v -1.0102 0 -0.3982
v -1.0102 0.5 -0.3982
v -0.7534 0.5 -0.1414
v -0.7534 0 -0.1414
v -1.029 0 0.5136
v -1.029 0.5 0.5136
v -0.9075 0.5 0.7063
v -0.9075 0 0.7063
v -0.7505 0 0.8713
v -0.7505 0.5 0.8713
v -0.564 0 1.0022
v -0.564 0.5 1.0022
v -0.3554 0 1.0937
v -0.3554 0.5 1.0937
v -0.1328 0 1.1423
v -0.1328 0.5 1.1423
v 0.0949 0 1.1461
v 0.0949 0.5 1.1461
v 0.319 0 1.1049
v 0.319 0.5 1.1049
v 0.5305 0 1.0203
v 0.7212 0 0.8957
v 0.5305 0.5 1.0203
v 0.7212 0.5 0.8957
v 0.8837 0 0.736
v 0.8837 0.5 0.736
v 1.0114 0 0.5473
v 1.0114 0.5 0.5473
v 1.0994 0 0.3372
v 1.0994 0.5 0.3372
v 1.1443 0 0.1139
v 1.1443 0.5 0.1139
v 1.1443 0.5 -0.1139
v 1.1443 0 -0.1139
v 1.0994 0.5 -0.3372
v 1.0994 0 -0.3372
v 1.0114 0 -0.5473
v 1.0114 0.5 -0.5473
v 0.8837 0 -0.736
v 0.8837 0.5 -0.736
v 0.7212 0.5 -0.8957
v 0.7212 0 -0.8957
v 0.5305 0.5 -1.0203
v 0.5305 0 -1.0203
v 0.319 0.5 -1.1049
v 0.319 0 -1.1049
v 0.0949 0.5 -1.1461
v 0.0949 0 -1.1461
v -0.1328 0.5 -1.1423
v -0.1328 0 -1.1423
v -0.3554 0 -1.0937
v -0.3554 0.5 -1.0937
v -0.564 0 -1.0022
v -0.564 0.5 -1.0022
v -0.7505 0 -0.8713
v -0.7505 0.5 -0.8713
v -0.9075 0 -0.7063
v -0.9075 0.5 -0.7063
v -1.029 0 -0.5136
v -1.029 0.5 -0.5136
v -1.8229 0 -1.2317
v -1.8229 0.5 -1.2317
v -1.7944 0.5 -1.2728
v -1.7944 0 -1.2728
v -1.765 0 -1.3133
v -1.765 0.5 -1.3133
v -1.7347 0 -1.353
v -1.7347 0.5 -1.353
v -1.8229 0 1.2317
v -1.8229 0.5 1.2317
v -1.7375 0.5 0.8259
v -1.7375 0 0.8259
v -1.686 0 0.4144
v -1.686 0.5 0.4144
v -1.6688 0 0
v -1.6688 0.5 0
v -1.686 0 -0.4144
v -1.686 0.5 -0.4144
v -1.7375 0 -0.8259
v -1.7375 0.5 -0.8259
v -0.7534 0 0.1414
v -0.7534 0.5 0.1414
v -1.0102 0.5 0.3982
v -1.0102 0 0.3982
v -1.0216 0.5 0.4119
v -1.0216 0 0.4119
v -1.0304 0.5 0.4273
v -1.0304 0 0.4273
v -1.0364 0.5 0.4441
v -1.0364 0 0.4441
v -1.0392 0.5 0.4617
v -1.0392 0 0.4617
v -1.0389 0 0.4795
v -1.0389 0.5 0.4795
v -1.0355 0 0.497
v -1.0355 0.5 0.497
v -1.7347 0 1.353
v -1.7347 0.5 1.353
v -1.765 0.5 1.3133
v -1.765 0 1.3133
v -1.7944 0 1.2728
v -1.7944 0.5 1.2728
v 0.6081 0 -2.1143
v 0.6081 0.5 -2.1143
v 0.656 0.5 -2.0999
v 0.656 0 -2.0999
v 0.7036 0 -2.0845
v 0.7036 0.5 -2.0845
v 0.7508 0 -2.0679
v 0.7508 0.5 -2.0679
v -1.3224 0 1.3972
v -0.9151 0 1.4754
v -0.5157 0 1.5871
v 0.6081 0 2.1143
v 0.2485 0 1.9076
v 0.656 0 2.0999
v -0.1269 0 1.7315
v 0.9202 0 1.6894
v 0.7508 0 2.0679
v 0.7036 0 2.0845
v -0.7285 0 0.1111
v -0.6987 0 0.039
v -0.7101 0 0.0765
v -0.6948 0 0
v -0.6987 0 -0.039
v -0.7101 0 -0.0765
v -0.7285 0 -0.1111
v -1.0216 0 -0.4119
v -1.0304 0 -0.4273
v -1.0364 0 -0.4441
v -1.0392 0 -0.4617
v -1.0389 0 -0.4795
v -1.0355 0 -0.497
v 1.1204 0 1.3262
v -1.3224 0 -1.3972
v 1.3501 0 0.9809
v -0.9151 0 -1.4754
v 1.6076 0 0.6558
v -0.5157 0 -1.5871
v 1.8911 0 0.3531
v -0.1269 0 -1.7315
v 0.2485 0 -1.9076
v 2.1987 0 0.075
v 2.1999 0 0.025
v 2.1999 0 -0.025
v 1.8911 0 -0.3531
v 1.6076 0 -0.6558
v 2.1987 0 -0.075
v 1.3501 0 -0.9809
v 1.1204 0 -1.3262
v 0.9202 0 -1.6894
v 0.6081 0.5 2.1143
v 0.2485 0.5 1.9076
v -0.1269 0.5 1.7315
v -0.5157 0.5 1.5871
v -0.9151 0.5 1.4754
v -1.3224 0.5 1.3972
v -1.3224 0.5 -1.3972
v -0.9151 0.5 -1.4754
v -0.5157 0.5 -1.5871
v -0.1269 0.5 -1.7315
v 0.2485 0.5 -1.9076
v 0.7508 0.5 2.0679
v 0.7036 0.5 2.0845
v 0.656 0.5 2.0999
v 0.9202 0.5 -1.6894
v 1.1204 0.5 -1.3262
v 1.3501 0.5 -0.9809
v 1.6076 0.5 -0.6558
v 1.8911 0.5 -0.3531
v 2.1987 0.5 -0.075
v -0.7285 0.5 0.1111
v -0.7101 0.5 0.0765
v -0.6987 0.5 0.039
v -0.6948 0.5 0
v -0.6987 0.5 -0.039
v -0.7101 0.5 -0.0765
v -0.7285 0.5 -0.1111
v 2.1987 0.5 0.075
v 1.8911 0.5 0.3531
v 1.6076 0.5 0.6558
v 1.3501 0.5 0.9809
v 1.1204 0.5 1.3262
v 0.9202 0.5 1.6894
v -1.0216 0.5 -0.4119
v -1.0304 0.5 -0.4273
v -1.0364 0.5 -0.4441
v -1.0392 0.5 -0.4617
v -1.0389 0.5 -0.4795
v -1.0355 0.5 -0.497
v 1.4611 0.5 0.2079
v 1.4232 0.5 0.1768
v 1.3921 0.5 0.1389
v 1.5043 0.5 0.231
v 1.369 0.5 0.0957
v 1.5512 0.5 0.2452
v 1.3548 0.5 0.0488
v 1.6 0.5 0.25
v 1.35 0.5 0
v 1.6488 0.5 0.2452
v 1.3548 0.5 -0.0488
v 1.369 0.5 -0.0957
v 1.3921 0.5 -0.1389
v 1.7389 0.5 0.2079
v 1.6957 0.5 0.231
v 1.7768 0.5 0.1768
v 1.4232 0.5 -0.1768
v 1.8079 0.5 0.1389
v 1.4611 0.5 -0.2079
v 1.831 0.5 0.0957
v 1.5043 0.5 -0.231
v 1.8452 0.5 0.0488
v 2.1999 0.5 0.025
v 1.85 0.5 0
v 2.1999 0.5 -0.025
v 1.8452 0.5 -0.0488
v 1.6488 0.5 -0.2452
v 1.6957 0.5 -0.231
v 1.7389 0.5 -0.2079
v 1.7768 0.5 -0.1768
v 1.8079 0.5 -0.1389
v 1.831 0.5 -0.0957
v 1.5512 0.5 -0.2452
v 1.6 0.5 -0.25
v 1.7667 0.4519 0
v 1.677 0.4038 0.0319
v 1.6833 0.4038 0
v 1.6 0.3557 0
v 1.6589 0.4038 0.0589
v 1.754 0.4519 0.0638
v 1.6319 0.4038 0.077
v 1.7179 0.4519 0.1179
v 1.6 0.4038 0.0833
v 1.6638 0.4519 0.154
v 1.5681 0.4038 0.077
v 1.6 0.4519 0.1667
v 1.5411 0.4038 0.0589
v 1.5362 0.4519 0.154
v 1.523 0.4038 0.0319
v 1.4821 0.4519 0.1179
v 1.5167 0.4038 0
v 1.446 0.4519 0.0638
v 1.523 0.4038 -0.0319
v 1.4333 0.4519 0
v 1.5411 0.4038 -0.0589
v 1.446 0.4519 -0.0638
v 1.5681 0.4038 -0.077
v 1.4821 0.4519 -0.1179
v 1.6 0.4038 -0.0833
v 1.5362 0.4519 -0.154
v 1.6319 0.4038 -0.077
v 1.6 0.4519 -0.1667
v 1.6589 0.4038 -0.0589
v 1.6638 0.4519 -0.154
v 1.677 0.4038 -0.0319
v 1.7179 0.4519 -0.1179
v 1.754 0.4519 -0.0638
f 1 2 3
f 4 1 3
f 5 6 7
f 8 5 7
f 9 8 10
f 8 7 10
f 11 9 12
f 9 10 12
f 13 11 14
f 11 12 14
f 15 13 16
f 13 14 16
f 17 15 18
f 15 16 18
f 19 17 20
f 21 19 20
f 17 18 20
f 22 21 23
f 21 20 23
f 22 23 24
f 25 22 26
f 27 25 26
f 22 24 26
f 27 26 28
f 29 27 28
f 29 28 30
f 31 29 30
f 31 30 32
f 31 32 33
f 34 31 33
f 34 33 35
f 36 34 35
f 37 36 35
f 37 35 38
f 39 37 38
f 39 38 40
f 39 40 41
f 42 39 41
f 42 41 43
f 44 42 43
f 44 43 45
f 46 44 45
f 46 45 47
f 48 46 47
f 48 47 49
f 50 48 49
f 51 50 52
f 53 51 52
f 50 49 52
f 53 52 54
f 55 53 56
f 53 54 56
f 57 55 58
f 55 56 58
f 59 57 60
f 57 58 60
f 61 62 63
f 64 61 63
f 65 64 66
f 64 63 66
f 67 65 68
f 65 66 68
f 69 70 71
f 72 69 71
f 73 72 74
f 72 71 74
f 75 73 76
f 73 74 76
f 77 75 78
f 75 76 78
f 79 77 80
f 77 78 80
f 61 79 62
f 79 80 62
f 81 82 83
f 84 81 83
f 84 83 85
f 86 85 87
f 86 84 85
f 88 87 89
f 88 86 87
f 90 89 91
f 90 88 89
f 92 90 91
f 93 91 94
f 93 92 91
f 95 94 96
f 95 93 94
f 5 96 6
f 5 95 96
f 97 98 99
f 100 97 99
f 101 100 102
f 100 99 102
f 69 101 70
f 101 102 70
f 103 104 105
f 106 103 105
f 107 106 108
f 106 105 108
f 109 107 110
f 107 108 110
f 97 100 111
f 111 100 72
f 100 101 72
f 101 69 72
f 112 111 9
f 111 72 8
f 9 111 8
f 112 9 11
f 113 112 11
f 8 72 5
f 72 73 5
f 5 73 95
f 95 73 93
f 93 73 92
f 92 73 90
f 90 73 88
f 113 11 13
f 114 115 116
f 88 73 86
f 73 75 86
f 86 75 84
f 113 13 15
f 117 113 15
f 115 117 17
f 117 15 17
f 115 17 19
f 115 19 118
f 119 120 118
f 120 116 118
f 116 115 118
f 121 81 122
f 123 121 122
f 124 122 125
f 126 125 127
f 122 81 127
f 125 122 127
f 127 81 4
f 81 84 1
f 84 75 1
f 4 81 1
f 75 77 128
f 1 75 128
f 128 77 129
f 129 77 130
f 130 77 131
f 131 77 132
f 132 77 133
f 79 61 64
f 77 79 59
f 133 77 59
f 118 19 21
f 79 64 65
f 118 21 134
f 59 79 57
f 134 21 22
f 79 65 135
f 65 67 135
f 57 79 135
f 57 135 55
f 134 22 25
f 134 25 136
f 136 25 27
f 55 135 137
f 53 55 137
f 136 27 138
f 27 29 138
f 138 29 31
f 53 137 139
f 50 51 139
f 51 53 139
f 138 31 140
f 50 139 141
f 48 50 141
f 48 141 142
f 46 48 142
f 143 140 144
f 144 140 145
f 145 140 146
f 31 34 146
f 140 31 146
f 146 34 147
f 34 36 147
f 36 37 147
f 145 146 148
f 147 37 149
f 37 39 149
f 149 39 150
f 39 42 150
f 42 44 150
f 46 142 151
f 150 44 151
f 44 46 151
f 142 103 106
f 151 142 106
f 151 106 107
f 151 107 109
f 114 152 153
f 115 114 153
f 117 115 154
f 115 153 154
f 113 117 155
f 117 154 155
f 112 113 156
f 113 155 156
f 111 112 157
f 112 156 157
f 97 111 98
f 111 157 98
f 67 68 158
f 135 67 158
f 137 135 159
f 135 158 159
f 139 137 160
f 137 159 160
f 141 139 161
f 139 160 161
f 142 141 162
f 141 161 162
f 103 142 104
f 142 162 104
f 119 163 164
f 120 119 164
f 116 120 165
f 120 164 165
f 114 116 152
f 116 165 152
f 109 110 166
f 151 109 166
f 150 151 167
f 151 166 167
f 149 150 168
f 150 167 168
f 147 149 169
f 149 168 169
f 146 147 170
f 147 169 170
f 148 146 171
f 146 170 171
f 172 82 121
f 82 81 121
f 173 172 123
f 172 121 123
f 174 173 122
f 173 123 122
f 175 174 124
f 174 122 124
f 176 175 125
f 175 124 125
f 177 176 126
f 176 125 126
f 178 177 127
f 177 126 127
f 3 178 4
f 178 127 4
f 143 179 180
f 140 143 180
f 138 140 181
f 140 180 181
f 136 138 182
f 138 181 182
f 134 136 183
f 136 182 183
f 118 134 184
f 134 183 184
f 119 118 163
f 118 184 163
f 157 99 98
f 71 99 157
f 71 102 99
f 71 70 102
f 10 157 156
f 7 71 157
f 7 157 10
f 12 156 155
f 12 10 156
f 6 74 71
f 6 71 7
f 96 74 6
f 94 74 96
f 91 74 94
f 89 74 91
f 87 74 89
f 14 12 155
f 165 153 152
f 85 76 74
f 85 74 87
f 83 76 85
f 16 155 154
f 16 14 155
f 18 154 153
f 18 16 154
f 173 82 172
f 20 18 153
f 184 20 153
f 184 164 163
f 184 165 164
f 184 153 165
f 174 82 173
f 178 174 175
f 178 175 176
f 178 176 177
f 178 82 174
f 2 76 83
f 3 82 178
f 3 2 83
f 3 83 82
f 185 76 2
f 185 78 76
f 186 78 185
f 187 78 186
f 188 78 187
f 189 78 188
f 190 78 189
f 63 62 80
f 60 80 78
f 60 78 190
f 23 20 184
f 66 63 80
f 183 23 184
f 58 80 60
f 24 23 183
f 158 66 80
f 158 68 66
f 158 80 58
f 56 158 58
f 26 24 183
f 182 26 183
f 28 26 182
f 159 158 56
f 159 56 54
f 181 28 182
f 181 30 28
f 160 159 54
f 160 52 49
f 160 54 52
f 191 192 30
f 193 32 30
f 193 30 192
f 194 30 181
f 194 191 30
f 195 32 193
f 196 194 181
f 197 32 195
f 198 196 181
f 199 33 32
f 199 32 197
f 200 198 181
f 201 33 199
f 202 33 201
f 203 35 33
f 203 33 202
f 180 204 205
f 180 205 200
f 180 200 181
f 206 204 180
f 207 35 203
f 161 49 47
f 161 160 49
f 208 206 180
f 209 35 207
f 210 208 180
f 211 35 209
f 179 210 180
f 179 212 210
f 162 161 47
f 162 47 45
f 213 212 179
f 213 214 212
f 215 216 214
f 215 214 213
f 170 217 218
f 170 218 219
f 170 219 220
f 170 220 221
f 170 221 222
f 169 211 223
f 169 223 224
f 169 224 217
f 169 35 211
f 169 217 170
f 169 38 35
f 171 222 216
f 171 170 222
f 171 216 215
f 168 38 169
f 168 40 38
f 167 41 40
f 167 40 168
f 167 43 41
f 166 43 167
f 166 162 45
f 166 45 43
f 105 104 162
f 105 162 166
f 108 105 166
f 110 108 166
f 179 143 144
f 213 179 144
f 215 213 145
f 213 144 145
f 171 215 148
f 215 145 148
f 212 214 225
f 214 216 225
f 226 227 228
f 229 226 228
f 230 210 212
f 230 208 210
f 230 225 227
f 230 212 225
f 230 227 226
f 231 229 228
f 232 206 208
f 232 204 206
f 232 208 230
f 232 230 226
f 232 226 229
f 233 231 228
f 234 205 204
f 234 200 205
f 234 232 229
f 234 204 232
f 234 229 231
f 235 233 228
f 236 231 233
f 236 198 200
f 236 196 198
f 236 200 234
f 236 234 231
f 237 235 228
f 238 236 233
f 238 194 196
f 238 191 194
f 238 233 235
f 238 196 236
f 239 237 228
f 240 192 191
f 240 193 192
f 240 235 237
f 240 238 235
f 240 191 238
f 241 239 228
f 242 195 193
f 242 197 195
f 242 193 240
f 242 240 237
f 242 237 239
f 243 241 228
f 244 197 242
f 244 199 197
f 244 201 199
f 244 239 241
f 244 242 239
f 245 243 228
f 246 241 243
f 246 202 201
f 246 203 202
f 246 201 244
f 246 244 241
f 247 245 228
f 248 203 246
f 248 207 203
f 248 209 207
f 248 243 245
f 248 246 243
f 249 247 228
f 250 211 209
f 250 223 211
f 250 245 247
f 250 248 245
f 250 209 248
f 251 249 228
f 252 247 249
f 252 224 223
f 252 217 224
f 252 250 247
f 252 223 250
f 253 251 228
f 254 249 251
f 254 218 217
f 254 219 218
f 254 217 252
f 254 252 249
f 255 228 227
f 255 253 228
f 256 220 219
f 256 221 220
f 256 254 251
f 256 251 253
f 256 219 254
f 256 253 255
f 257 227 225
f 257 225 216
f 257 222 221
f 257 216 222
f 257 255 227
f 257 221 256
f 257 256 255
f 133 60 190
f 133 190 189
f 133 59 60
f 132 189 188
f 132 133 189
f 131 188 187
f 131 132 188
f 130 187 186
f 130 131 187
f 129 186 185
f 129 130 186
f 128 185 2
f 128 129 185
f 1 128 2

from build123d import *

# Parameters (mm, degrees)
SKETCH2_R           = 2.2
BOSS_EXTRUDE2_DEPTH = 0.5
SKETCH3_OUTSIDE_W   = 7.648
SKETCH3_OUTSIDE_H   = 7.648
CUT_EXTRUDE1_DEPTH  = 0.5
CUT_EXTRUDE2_REACH  = 2.5
FILLET1_R           = 0.2
FILLET2_R           = 0.1


with BuildPart() as part:
    # Sketch2 → Boss-Extrude2 (new body)
    with BuildSketch(Plane(origin=(0, 0, 0), x_dir=(1, 0, 0), z_dir=(0, 1, 0))):
        Circle(SKETCH2_R)
    extrude(amount=BOSS_EXTRUDE2_DEPTH)

    # Sketch3 outside → Cut-Extrude1 (cut)
    with BuildSketch(Plane(origin=(0, 0.5, 0), x_dir=(1, 0, 0), z_dir=(0, 1, 0))):
        Rectangle(SKETCH3_OUTSIDE_W, SKETCH3_OUTSIDE_H)
        with BuildLine():
            ThreePointArc((0.750757799, 2.067936829), (1.350081886, 0.980891906), (2.198721715, 0.074985473))
            ThreePointArc((2.198721715, 0.074985473), (2.2, 0), (2.198721715, -0.074985473))
            ThreePointArc((2.198721715, -0.074985473), (1.350081886, -0.980891906), (0.750757799, -2.067936829))
            ThreePointArc((0.750757799, -2.067936829), (0.679837388, -2.092324336), (0.608126953, -2.1142804))
            ThreePointArc((0.608126953, -2.1142804), (-0.515685393, -1.587116444), (-1.734727878, -1.35304072))
            ThreePointArc((-1.734727878, -1.35304072), (-1.779837388, -1.293127555), (-1.822878589, -1.231711675))
            ThreePointArc((-1.822878589, -1.231711675), (-1.668792986, 0), (-1.822878589, 1.231711675))
            ThreePointArc((-1.822878589, 1.231711675), (-1.779837388, 1.293127555), (-1.734727878, 1.35304072))
            ThreePointArc((-1.734727878, 1.35304072), (-0.515685393, 1.587116444), (0.608126953, 2.1142804))
            ThreePointArc((0.608126953, 2.1142804), (0.679837388, 2.092324336), (0.750757799, 2.067936829))
        make_face(mode=Mode.SUBTRACT)
    extrude(amount=-CUT_EXTRUDE1_DEPTH, mode=Mode.SUBTRACT)

    # Sketch4 → Cut-Extrude2 (cut, up to next)
    with BuildSketch(Plane(origin=(0, 0.5, 0), x_dir=(1, 0, 0), z_dir=(0, 1, 0)), mode=Mode.PRIVATE) as cut_extrude2_sk1:
        with BuildLine():
            Line((-1.059401619, 0.447401619), (-0.612, 0))
            Line((-0.612, 0), (-1.059401619, -0.447401619))
            ThreePointArc((-1.059401619, -0.447401619), (1.15, 0), (-1.059401619, 0.447401619))
        make_face()
    cut_extrude2_tool1 = extrude(cut_extrude2_sk1.sketch, amount=-CUT_EXTRUDE2_REACH, mode=Mode.PRIVATE) & part.part
    add(cut_extrude2_tool1.solids().sort_by_distance((0.062027, 0.5, 0))[0], mode=Mode.SUBTRACT)

    # Fillet1
    fillet1_edges = [part.edges().sort_by_distance(p)[0] for p in [
        (-0.612, 0.25, 0),
    ]]
    fillet(fillet1_edges, radius=FILLET1_R)

    # Fillet2
    fillet2_edges = [part.edges().sort_by_distance(p)[0] for p in [
        (-1.059401619, 0.25, -0.447401619),
        (-1.059401619, 0.25, 0.447401619),
    ]]
    fillet(fillet2_edges, radius=FILLET2_R)

    # Sketch6 → Cut-Revolve7 (revolve, cut)
    with BuildSketch(Plane.XY):
        Polygon((1.6, 0.5), (1.6, 0.355662433), (1.85, 0.5), align=None)
    revolve(axis=Axis((1.6, 0.5, 0), (0, -1, 0)), mode=Mode.SUBTRACT)


solid = part.part
